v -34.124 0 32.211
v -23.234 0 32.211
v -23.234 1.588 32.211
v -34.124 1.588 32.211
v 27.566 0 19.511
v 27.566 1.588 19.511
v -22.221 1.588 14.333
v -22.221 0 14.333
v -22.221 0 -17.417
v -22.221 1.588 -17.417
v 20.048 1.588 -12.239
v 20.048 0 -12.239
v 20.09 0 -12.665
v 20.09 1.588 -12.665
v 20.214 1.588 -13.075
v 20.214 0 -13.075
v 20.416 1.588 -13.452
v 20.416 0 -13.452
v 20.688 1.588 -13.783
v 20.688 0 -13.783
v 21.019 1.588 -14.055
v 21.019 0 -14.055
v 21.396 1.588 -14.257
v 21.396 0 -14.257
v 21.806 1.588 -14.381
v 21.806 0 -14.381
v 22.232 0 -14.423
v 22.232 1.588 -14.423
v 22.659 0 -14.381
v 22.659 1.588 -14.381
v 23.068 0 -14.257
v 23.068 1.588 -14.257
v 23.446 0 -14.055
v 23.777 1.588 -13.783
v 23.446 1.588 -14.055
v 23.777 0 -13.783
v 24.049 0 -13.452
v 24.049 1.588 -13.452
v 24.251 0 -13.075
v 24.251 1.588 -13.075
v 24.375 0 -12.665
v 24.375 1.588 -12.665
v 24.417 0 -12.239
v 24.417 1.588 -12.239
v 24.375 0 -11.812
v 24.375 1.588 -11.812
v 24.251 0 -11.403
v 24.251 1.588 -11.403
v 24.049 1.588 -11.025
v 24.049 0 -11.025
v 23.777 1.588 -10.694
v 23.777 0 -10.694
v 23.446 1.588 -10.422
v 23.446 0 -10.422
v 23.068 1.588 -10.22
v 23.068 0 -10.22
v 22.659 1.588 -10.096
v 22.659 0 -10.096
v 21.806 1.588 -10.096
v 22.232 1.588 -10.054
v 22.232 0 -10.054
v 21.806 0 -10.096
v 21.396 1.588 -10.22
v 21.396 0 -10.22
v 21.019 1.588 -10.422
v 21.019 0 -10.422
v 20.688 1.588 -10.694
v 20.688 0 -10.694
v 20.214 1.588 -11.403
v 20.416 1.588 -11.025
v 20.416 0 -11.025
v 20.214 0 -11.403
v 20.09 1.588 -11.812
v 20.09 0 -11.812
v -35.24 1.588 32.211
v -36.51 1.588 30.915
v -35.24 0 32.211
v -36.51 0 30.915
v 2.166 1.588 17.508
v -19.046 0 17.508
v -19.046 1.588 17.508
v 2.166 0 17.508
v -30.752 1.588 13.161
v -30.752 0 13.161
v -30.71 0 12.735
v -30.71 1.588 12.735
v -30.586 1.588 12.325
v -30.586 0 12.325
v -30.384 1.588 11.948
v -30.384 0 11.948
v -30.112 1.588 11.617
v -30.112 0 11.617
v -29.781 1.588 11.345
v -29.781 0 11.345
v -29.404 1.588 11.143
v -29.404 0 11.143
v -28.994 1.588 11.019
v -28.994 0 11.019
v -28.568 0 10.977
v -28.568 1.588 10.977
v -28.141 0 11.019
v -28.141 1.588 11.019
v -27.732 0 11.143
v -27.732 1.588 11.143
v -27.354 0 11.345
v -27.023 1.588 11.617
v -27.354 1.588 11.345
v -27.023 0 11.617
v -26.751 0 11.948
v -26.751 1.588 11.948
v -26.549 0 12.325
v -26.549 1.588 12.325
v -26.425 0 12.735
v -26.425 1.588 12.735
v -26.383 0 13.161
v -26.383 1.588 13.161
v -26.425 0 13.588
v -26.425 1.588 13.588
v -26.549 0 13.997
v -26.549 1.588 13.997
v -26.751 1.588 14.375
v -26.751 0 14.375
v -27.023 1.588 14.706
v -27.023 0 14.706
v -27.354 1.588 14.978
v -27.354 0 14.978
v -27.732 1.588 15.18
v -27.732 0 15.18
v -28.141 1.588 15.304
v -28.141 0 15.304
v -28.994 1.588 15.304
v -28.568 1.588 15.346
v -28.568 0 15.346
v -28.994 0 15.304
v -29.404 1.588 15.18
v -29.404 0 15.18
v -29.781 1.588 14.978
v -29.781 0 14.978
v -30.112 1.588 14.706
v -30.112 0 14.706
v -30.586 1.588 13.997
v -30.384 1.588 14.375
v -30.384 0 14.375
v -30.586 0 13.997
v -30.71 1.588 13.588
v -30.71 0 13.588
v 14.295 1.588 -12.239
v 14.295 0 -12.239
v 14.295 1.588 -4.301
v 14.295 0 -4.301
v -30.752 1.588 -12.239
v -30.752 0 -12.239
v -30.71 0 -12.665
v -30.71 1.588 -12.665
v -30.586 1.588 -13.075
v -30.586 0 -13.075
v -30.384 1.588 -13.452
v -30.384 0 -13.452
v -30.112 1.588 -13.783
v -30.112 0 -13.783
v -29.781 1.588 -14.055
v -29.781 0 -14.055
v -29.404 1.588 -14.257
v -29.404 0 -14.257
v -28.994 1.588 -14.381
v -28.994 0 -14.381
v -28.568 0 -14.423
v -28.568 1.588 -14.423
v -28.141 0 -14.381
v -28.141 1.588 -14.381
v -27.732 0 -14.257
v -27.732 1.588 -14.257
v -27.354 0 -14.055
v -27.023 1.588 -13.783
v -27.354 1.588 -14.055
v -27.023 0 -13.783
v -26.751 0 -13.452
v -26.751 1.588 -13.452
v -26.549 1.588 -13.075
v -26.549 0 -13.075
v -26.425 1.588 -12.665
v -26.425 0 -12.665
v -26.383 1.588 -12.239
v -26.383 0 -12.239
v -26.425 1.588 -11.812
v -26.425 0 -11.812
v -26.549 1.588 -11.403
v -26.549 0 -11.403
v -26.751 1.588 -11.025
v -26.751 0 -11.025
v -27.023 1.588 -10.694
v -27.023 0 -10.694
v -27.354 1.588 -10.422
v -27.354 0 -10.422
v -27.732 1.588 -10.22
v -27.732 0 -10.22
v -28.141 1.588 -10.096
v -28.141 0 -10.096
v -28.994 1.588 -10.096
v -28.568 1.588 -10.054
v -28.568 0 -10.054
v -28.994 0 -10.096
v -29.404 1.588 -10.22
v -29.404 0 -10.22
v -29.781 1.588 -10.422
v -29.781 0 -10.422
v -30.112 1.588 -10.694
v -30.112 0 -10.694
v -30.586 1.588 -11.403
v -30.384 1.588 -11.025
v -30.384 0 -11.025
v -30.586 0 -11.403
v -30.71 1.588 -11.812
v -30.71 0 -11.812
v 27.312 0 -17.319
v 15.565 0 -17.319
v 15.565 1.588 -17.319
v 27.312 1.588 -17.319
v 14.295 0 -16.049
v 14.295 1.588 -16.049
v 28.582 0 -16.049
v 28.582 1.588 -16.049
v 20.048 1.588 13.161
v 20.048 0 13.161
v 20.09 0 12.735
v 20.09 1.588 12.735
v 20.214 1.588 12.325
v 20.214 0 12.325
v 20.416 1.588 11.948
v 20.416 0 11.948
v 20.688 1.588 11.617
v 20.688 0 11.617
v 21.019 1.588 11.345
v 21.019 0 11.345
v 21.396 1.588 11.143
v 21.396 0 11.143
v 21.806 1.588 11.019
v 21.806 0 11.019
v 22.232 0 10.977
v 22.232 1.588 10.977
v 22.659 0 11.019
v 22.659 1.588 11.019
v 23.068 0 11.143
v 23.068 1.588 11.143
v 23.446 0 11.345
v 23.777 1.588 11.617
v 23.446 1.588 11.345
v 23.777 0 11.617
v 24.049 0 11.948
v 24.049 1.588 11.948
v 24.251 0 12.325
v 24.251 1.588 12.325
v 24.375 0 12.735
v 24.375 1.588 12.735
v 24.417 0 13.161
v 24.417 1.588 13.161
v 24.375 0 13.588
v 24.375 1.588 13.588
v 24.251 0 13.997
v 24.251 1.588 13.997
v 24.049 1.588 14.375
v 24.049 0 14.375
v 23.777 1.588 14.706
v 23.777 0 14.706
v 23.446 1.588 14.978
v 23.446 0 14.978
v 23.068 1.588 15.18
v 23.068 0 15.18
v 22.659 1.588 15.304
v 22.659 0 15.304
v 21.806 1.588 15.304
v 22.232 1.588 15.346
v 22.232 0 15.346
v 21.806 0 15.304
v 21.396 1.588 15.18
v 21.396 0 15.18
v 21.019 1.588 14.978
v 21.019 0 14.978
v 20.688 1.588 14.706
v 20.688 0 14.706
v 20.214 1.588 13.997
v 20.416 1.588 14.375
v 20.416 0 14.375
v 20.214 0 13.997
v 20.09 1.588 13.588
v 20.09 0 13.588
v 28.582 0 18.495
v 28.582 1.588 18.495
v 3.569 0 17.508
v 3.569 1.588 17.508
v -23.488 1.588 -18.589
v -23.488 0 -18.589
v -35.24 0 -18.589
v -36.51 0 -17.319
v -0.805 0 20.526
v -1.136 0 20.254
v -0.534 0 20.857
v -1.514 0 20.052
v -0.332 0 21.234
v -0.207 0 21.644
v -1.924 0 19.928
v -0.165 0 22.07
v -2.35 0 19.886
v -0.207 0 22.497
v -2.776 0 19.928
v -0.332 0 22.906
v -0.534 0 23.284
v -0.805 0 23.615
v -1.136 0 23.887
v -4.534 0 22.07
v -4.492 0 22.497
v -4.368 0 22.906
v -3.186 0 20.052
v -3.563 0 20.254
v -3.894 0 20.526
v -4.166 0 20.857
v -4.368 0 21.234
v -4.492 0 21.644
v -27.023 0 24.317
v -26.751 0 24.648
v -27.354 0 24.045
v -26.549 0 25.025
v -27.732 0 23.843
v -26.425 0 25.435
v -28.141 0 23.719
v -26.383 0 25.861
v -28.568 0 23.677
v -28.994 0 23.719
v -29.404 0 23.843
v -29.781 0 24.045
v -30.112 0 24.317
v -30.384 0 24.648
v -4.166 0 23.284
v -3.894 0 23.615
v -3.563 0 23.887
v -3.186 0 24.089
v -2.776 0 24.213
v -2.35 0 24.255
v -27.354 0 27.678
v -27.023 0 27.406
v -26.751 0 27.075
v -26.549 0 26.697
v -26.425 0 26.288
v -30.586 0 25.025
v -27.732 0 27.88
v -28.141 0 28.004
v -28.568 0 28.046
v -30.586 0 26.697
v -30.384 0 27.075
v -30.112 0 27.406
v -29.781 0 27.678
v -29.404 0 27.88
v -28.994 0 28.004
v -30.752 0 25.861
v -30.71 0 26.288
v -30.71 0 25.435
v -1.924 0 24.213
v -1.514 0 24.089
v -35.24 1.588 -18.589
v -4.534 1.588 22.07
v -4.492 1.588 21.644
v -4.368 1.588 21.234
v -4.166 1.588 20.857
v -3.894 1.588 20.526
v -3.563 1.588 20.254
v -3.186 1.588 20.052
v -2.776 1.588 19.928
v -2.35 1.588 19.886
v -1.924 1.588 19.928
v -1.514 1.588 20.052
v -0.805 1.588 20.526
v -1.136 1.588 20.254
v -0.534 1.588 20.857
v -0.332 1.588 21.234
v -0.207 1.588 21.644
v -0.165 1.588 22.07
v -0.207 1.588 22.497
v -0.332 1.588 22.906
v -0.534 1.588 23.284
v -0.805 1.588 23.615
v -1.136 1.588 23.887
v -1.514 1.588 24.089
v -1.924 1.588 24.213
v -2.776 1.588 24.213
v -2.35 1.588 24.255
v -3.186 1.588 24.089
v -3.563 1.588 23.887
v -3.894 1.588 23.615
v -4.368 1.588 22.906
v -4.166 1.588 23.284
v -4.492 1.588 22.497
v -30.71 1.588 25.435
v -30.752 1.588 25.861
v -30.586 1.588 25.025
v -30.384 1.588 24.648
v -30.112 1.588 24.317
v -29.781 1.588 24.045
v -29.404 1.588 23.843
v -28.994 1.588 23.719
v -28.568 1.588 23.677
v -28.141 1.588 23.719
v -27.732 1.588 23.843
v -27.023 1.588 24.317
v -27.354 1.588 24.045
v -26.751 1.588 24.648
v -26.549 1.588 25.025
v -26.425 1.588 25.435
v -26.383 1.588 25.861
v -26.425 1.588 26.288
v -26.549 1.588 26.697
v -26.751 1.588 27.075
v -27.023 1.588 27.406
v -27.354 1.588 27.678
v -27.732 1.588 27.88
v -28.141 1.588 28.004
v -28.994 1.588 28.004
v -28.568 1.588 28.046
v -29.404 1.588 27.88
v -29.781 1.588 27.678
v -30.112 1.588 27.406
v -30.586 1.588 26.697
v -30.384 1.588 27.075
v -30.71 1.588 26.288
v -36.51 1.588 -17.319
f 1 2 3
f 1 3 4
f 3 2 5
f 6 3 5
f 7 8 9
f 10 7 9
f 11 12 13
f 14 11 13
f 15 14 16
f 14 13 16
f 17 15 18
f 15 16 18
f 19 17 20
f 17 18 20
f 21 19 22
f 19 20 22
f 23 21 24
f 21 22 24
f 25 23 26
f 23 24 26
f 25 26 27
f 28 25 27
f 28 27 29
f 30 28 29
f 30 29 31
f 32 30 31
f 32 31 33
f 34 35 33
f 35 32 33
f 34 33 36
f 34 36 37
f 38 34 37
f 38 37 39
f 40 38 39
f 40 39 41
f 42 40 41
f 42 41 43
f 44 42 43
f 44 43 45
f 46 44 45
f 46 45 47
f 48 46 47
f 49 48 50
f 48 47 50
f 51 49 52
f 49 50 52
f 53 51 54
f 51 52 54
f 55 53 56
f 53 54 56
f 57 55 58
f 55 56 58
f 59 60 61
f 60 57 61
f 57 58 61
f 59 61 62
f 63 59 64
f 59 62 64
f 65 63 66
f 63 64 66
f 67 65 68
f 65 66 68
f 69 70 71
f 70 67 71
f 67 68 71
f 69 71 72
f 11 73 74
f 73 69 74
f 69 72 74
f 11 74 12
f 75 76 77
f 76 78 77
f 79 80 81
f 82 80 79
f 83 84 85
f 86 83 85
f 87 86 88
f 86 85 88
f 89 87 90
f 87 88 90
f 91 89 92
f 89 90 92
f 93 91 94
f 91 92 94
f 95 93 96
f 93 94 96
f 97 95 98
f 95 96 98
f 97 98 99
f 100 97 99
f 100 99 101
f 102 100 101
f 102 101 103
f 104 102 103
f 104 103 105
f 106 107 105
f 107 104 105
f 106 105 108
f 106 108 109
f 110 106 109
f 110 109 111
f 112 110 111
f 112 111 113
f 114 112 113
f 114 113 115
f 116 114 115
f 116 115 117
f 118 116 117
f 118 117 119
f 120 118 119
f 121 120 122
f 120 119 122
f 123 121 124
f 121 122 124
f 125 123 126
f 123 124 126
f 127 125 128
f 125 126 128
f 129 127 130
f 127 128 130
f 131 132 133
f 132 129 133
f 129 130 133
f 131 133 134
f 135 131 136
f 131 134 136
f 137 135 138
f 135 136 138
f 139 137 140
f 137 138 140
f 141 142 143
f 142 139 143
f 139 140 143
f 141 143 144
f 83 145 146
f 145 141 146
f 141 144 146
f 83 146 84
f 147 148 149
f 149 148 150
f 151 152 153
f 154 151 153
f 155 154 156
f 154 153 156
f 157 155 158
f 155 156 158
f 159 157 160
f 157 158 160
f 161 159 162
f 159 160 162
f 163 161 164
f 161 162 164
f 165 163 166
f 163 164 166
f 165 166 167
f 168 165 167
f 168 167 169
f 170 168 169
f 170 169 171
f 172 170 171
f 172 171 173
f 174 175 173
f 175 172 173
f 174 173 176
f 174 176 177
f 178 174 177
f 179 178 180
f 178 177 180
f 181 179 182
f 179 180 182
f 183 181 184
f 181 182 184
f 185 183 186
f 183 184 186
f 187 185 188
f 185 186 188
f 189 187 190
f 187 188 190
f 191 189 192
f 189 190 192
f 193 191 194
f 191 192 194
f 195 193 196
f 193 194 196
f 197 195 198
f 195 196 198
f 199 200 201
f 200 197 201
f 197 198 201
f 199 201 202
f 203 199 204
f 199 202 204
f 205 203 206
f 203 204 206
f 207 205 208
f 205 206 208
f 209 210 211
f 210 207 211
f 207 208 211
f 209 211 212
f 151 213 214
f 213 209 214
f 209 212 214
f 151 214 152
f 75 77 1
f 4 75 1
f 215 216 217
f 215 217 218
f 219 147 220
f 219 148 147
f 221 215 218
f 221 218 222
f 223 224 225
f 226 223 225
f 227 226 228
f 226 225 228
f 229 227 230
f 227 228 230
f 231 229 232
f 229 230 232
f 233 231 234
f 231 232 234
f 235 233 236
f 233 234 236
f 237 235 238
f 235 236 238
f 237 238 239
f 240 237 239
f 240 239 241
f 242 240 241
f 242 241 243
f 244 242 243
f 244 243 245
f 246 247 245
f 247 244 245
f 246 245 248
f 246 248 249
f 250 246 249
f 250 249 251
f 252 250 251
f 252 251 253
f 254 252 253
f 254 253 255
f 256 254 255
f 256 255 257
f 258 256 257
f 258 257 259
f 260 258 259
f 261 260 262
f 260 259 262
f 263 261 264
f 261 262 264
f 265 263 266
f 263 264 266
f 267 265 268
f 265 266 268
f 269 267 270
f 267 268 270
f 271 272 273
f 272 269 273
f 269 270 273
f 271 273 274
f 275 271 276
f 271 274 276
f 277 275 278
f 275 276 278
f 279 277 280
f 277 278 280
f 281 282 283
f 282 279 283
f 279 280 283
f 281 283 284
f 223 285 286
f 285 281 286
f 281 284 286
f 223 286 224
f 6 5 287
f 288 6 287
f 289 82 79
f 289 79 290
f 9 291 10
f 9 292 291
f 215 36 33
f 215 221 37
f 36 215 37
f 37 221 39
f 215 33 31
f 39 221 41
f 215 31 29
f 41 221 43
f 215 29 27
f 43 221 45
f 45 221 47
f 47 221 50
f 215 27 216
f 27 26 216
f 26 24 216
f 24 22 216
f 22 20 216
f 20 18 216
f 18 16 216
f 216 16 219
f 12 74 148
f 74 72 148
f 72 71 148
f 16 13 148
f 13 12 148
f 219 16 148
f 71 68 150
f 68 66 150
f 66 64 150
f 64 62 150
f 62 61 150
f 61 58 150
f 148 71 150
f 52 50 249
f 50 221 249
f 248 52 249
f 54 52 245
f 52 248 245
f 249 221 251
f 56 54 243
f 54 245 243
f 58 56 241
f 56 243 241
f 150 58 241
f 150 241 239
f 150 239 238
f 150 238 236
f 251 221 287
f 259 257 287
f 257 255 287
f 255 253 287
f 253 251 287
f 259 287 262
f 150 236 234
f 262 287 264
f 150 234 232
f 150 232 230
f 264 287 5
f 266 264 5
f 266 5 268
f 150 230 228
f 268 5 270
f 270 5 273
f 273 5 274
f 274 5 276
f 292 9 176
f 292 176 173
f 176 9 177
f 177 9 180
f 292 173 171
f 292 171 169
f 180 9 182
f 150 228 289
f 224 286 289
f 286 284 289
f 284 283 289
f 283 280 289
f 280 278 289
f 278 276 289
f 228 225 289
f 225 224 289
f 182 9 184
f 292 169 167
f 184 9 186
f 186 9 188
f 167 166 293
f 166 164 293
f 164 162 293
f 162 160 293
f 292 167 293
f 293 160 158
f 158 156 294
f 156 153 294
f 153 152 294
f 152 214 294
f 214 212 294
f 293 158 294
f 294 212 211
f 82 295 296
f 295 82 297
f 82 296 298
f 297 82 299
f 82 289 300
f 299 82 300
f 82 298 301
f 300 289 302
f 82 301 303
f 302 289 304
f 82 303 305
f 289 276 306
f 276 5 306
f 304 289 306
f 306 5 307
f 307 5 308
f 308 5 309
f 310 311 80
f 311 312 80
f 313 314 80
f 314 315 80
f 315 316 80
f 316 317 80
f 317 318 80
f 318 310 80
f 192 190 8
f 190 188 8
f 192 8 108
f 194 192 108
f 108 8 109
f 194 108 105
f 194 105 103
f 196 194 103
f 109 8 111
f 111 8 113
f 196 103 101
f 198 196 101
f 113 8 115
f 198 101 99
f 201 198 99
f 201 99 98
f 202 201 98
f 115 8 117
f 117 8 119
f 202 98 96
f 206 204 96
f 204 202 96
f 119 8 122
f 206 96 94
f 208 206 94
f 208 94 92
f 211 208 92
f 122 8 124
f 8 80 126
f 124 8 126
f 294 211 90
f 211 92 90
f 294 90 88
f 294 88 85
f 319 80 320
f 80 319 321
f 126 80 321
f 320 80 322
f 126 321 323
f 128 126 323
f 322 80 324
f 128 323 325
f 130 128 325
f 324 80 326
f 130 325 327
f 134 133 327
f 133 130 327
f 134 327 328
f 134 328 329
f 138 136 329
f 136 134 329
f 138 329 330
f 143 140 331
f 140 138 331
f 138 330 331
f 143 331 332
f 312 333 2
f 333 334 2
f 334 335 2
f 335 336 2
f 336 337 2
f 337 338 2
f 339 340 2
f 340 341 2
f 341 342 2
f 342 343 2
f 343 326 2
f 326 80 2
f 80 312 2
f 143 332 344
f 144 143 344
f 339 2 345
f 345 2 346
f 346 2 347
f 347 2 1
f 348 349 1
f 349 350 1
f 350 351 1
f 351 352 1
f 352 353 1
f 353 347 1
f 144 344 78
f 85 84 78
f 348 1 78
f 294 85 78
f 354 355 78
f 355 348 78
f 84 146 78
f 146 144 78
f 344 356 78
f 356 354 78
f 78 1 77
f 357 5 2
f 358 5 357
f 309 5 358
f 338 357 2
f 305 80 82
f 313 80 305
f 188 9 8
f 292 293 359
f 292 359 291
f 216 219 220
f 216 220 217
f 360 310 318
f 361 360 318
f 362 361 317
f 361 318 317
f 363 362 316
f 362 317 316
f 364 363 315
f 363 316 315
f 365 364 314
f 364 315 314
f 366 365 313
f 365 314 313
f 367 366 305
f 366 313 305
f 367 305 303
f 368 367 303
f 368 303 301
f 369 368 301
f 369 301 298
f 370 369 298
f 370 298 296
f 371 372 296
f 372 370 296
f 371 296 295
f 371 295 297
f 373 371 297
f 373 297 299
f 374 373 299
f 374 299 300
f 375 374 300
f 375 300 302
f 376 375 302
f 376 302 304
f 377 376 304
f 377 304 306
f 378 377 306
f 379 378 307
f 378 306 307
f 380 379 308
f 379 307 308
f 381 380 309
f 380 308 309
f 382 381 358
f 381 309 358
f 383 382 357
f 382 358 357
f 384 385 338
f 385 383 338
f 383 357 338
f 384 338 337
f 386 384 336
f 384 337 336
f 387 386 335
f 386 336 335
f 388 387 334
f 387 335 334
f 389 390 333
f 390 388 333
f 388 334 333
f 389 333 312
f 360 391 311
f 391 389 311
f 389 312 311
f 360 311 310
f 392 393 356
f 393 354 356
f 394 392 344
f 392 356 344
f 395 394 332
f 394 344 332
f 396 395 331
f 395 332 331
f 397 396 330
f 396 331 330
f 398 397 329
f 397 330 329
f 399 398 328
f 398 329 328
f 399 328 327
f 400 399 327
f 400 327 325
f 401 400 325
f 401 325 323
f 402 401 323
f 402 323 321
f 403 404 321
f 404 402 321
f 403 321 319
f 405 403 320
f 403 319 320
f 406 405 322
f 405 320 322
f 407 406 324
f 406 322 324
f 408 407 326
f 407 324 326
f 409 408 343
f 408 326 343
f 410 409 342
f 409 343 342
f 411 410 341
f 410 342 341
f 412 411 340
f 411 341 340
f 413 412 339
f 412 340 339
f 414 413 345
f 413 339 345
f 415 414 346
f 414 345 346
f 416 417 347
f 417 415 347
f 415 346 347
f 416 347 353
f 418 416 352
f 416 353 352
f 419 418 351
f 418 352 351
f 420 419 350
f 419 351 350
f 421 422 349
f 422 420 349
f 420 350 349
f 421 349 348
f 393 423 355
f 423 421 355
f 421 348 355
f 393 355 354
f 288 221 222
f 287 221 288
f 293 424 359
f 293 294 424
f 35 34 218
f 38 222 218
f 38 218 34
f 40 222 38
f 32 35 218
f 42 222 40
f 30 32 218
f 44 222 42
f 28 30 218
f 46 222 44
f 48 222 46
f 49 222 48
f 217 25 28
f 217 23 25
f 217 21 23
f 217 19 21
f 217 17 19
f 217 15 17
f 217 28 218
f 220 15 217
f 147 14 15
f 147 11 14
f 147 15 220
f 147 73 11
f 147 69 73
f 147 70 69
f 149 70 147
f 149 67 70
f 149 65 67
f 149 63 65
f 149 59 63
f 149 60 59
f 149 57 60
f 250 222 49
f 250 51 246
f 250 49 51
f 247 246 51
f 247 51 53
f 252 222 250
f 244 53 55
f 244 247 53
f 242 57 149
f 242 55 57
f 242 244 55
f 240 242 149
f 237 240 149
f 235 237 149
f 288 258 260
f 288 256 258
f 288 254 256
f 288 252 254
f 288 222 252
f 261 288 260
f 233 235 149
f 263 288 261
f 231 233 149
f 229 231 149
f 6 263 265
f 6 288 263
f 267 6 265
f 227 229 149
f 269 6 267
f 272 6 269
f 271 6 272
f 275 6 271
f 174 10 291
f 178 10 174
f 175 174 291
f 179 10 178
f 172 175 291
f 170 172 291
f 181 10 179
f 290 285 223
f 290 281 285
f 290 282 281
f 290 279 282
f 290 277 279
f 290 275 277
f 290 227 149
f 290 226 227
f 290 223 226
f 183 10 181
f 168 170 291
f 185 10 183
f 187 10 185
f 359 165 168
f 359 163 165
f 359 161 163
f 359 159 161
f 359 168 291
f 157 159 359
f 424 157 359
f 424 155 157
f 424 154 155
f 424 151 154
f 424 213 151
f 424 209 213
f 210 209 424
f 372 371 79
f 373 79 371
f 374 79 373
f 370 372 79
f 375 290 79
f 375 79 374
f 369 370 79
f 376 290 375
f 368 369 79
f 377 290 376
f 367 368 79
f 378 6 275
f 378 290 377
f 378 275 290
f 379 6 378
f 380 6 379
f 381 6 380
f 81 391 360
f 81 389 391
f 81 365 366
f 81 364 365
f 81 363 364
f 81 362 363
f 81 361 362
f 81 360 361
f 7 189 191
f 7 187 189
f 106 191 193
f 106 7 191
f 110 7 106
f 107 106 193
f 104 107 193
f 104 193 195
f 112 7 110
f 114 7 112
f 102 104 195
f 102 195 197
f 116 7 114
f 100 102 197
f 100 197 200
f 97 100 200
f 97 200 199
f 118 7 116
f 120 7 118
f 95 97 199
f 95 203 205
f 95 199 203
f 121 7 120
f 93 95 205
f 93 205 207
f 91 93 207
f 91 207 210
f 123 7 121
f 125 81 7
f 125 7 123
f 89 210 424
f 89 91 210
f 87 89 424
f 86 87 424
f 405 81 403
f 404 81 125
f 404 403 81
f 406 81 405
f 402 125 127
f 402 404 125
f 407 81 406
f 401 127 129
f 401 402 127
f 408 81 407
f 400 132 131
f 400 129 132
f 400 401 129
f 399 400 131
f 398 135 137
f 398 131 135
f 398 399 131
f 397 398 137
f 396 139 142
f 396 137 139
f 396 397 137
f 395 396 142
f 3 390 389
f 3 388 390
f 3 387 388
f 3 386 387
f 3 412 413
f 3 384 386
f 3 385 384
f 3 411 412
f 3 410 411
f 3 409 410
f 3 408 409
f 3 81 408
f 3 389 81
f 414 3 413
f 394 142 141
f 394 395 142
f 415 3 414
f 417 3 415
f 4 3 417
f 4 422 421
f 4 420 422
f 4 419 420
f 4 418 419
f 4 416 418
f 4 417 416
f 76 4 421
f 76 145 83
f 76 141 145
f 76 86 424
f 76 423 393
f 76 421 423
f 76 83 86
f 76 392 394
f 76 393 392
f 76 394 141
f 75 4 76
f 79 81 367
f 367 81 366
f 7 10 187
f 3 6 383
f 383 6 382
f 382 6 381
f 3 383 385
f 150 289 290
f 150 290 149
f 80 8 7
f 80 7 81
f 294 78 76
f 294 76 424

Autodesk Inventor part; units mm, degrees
ref_plane "YZ Plane" through (0, 0, 0) normal (1, 0, 0) x (0, 1, 0)
ref_plane "XZ Plane" through (0, 0, 0) normal (0, 1, 0) x (-1, 0, 0)
ref_plane "XY Plane" through (0, 0, 0) normal (0, 0, 1) x (1, 0, 0)
sketch "Sketch1" plane through (0, 0, 0) normal (0, 1, 0) x (-1, 0, 0)
  circle A0 centre (28.5676, 25.8614) radius 2.1844
  circle A1 centre (28.5676, -12.2386) radius 2.1844
  circle A2 centre (28.5676, 13.1614) radius 2.1844
  circle A3 centre (-22.2324, -12.2386) radius 2.1844
  circle A4 centre (-22.2324, 13.1614) radius 2.1844
  line L0 (23.2336, 32.2114) -> (-27.5664, 19.5114)
  line L1 (-27.5664, 19.5114) -> (-28.5824, 18.4954)
  line L2 (23.2336, 32.2114) -> (34.1239, 32.2114)
  line L3 (35.2397, -18.5886) -> (23.4876, -18.5886)
  line L4 (36.5097, 30.9154) -> (36.5097, -17.3186)
  line L5 (22.2214, 14.3333) -> (22.2214, -17.4167)
  line L6 (19.0464, 17.5083) -> (-2.1664, 17.5083)
  line L7 (-14.2949, -16.0486) -> (-15.5649, -17.3186)
  line L8 (-27.3124, -17.3186) -> (-28.5824, -16.0486)
  line L9 (22.2214, 14.3333) -> (19.0464, 17.5083)
  line L10 (36.5097, 30.9154) -> (35.24, 32.2114)
  line L11 (36.5097, -17.3186) -> (35.2397, -18.5886)
  line L12 (23.4876, -18.5886) -> (22.2214, -17.4167)
  line L13 (35.24, 32.2114) -> (34.1239, 32.2114)
  line L14 (-15.5649, -17.3186) -> (-27.3124, -17.3186)
  line L15 (-28.5824, -16.0486) -> (-28.5824, 18.4954)
  line L16 (-14.2949, -12.2386) -> (-14.2949, -16.0486)
  line L17 (-14.2949, -12.2386) -> (-14.2949, -4.3011)
  line L18 (-3.5693, 17.5083) -> (-14.2949, -4.3011)
  line L19 (-2.1664, 17.5083) -> (-3.5693, 17.5083)
  circle A5 centre (2.3498, 22.0704) radius 2.1844
  point P0 (0, 0)
  point P1 (36.5051, 32.2114)
  dimension "d0" = 31.75
  dimension "d6" = 4.3688
extrude "Extrusion1" add sketch "Sketch1" along normal blind 1.5875
properties part number "backFunnel"
